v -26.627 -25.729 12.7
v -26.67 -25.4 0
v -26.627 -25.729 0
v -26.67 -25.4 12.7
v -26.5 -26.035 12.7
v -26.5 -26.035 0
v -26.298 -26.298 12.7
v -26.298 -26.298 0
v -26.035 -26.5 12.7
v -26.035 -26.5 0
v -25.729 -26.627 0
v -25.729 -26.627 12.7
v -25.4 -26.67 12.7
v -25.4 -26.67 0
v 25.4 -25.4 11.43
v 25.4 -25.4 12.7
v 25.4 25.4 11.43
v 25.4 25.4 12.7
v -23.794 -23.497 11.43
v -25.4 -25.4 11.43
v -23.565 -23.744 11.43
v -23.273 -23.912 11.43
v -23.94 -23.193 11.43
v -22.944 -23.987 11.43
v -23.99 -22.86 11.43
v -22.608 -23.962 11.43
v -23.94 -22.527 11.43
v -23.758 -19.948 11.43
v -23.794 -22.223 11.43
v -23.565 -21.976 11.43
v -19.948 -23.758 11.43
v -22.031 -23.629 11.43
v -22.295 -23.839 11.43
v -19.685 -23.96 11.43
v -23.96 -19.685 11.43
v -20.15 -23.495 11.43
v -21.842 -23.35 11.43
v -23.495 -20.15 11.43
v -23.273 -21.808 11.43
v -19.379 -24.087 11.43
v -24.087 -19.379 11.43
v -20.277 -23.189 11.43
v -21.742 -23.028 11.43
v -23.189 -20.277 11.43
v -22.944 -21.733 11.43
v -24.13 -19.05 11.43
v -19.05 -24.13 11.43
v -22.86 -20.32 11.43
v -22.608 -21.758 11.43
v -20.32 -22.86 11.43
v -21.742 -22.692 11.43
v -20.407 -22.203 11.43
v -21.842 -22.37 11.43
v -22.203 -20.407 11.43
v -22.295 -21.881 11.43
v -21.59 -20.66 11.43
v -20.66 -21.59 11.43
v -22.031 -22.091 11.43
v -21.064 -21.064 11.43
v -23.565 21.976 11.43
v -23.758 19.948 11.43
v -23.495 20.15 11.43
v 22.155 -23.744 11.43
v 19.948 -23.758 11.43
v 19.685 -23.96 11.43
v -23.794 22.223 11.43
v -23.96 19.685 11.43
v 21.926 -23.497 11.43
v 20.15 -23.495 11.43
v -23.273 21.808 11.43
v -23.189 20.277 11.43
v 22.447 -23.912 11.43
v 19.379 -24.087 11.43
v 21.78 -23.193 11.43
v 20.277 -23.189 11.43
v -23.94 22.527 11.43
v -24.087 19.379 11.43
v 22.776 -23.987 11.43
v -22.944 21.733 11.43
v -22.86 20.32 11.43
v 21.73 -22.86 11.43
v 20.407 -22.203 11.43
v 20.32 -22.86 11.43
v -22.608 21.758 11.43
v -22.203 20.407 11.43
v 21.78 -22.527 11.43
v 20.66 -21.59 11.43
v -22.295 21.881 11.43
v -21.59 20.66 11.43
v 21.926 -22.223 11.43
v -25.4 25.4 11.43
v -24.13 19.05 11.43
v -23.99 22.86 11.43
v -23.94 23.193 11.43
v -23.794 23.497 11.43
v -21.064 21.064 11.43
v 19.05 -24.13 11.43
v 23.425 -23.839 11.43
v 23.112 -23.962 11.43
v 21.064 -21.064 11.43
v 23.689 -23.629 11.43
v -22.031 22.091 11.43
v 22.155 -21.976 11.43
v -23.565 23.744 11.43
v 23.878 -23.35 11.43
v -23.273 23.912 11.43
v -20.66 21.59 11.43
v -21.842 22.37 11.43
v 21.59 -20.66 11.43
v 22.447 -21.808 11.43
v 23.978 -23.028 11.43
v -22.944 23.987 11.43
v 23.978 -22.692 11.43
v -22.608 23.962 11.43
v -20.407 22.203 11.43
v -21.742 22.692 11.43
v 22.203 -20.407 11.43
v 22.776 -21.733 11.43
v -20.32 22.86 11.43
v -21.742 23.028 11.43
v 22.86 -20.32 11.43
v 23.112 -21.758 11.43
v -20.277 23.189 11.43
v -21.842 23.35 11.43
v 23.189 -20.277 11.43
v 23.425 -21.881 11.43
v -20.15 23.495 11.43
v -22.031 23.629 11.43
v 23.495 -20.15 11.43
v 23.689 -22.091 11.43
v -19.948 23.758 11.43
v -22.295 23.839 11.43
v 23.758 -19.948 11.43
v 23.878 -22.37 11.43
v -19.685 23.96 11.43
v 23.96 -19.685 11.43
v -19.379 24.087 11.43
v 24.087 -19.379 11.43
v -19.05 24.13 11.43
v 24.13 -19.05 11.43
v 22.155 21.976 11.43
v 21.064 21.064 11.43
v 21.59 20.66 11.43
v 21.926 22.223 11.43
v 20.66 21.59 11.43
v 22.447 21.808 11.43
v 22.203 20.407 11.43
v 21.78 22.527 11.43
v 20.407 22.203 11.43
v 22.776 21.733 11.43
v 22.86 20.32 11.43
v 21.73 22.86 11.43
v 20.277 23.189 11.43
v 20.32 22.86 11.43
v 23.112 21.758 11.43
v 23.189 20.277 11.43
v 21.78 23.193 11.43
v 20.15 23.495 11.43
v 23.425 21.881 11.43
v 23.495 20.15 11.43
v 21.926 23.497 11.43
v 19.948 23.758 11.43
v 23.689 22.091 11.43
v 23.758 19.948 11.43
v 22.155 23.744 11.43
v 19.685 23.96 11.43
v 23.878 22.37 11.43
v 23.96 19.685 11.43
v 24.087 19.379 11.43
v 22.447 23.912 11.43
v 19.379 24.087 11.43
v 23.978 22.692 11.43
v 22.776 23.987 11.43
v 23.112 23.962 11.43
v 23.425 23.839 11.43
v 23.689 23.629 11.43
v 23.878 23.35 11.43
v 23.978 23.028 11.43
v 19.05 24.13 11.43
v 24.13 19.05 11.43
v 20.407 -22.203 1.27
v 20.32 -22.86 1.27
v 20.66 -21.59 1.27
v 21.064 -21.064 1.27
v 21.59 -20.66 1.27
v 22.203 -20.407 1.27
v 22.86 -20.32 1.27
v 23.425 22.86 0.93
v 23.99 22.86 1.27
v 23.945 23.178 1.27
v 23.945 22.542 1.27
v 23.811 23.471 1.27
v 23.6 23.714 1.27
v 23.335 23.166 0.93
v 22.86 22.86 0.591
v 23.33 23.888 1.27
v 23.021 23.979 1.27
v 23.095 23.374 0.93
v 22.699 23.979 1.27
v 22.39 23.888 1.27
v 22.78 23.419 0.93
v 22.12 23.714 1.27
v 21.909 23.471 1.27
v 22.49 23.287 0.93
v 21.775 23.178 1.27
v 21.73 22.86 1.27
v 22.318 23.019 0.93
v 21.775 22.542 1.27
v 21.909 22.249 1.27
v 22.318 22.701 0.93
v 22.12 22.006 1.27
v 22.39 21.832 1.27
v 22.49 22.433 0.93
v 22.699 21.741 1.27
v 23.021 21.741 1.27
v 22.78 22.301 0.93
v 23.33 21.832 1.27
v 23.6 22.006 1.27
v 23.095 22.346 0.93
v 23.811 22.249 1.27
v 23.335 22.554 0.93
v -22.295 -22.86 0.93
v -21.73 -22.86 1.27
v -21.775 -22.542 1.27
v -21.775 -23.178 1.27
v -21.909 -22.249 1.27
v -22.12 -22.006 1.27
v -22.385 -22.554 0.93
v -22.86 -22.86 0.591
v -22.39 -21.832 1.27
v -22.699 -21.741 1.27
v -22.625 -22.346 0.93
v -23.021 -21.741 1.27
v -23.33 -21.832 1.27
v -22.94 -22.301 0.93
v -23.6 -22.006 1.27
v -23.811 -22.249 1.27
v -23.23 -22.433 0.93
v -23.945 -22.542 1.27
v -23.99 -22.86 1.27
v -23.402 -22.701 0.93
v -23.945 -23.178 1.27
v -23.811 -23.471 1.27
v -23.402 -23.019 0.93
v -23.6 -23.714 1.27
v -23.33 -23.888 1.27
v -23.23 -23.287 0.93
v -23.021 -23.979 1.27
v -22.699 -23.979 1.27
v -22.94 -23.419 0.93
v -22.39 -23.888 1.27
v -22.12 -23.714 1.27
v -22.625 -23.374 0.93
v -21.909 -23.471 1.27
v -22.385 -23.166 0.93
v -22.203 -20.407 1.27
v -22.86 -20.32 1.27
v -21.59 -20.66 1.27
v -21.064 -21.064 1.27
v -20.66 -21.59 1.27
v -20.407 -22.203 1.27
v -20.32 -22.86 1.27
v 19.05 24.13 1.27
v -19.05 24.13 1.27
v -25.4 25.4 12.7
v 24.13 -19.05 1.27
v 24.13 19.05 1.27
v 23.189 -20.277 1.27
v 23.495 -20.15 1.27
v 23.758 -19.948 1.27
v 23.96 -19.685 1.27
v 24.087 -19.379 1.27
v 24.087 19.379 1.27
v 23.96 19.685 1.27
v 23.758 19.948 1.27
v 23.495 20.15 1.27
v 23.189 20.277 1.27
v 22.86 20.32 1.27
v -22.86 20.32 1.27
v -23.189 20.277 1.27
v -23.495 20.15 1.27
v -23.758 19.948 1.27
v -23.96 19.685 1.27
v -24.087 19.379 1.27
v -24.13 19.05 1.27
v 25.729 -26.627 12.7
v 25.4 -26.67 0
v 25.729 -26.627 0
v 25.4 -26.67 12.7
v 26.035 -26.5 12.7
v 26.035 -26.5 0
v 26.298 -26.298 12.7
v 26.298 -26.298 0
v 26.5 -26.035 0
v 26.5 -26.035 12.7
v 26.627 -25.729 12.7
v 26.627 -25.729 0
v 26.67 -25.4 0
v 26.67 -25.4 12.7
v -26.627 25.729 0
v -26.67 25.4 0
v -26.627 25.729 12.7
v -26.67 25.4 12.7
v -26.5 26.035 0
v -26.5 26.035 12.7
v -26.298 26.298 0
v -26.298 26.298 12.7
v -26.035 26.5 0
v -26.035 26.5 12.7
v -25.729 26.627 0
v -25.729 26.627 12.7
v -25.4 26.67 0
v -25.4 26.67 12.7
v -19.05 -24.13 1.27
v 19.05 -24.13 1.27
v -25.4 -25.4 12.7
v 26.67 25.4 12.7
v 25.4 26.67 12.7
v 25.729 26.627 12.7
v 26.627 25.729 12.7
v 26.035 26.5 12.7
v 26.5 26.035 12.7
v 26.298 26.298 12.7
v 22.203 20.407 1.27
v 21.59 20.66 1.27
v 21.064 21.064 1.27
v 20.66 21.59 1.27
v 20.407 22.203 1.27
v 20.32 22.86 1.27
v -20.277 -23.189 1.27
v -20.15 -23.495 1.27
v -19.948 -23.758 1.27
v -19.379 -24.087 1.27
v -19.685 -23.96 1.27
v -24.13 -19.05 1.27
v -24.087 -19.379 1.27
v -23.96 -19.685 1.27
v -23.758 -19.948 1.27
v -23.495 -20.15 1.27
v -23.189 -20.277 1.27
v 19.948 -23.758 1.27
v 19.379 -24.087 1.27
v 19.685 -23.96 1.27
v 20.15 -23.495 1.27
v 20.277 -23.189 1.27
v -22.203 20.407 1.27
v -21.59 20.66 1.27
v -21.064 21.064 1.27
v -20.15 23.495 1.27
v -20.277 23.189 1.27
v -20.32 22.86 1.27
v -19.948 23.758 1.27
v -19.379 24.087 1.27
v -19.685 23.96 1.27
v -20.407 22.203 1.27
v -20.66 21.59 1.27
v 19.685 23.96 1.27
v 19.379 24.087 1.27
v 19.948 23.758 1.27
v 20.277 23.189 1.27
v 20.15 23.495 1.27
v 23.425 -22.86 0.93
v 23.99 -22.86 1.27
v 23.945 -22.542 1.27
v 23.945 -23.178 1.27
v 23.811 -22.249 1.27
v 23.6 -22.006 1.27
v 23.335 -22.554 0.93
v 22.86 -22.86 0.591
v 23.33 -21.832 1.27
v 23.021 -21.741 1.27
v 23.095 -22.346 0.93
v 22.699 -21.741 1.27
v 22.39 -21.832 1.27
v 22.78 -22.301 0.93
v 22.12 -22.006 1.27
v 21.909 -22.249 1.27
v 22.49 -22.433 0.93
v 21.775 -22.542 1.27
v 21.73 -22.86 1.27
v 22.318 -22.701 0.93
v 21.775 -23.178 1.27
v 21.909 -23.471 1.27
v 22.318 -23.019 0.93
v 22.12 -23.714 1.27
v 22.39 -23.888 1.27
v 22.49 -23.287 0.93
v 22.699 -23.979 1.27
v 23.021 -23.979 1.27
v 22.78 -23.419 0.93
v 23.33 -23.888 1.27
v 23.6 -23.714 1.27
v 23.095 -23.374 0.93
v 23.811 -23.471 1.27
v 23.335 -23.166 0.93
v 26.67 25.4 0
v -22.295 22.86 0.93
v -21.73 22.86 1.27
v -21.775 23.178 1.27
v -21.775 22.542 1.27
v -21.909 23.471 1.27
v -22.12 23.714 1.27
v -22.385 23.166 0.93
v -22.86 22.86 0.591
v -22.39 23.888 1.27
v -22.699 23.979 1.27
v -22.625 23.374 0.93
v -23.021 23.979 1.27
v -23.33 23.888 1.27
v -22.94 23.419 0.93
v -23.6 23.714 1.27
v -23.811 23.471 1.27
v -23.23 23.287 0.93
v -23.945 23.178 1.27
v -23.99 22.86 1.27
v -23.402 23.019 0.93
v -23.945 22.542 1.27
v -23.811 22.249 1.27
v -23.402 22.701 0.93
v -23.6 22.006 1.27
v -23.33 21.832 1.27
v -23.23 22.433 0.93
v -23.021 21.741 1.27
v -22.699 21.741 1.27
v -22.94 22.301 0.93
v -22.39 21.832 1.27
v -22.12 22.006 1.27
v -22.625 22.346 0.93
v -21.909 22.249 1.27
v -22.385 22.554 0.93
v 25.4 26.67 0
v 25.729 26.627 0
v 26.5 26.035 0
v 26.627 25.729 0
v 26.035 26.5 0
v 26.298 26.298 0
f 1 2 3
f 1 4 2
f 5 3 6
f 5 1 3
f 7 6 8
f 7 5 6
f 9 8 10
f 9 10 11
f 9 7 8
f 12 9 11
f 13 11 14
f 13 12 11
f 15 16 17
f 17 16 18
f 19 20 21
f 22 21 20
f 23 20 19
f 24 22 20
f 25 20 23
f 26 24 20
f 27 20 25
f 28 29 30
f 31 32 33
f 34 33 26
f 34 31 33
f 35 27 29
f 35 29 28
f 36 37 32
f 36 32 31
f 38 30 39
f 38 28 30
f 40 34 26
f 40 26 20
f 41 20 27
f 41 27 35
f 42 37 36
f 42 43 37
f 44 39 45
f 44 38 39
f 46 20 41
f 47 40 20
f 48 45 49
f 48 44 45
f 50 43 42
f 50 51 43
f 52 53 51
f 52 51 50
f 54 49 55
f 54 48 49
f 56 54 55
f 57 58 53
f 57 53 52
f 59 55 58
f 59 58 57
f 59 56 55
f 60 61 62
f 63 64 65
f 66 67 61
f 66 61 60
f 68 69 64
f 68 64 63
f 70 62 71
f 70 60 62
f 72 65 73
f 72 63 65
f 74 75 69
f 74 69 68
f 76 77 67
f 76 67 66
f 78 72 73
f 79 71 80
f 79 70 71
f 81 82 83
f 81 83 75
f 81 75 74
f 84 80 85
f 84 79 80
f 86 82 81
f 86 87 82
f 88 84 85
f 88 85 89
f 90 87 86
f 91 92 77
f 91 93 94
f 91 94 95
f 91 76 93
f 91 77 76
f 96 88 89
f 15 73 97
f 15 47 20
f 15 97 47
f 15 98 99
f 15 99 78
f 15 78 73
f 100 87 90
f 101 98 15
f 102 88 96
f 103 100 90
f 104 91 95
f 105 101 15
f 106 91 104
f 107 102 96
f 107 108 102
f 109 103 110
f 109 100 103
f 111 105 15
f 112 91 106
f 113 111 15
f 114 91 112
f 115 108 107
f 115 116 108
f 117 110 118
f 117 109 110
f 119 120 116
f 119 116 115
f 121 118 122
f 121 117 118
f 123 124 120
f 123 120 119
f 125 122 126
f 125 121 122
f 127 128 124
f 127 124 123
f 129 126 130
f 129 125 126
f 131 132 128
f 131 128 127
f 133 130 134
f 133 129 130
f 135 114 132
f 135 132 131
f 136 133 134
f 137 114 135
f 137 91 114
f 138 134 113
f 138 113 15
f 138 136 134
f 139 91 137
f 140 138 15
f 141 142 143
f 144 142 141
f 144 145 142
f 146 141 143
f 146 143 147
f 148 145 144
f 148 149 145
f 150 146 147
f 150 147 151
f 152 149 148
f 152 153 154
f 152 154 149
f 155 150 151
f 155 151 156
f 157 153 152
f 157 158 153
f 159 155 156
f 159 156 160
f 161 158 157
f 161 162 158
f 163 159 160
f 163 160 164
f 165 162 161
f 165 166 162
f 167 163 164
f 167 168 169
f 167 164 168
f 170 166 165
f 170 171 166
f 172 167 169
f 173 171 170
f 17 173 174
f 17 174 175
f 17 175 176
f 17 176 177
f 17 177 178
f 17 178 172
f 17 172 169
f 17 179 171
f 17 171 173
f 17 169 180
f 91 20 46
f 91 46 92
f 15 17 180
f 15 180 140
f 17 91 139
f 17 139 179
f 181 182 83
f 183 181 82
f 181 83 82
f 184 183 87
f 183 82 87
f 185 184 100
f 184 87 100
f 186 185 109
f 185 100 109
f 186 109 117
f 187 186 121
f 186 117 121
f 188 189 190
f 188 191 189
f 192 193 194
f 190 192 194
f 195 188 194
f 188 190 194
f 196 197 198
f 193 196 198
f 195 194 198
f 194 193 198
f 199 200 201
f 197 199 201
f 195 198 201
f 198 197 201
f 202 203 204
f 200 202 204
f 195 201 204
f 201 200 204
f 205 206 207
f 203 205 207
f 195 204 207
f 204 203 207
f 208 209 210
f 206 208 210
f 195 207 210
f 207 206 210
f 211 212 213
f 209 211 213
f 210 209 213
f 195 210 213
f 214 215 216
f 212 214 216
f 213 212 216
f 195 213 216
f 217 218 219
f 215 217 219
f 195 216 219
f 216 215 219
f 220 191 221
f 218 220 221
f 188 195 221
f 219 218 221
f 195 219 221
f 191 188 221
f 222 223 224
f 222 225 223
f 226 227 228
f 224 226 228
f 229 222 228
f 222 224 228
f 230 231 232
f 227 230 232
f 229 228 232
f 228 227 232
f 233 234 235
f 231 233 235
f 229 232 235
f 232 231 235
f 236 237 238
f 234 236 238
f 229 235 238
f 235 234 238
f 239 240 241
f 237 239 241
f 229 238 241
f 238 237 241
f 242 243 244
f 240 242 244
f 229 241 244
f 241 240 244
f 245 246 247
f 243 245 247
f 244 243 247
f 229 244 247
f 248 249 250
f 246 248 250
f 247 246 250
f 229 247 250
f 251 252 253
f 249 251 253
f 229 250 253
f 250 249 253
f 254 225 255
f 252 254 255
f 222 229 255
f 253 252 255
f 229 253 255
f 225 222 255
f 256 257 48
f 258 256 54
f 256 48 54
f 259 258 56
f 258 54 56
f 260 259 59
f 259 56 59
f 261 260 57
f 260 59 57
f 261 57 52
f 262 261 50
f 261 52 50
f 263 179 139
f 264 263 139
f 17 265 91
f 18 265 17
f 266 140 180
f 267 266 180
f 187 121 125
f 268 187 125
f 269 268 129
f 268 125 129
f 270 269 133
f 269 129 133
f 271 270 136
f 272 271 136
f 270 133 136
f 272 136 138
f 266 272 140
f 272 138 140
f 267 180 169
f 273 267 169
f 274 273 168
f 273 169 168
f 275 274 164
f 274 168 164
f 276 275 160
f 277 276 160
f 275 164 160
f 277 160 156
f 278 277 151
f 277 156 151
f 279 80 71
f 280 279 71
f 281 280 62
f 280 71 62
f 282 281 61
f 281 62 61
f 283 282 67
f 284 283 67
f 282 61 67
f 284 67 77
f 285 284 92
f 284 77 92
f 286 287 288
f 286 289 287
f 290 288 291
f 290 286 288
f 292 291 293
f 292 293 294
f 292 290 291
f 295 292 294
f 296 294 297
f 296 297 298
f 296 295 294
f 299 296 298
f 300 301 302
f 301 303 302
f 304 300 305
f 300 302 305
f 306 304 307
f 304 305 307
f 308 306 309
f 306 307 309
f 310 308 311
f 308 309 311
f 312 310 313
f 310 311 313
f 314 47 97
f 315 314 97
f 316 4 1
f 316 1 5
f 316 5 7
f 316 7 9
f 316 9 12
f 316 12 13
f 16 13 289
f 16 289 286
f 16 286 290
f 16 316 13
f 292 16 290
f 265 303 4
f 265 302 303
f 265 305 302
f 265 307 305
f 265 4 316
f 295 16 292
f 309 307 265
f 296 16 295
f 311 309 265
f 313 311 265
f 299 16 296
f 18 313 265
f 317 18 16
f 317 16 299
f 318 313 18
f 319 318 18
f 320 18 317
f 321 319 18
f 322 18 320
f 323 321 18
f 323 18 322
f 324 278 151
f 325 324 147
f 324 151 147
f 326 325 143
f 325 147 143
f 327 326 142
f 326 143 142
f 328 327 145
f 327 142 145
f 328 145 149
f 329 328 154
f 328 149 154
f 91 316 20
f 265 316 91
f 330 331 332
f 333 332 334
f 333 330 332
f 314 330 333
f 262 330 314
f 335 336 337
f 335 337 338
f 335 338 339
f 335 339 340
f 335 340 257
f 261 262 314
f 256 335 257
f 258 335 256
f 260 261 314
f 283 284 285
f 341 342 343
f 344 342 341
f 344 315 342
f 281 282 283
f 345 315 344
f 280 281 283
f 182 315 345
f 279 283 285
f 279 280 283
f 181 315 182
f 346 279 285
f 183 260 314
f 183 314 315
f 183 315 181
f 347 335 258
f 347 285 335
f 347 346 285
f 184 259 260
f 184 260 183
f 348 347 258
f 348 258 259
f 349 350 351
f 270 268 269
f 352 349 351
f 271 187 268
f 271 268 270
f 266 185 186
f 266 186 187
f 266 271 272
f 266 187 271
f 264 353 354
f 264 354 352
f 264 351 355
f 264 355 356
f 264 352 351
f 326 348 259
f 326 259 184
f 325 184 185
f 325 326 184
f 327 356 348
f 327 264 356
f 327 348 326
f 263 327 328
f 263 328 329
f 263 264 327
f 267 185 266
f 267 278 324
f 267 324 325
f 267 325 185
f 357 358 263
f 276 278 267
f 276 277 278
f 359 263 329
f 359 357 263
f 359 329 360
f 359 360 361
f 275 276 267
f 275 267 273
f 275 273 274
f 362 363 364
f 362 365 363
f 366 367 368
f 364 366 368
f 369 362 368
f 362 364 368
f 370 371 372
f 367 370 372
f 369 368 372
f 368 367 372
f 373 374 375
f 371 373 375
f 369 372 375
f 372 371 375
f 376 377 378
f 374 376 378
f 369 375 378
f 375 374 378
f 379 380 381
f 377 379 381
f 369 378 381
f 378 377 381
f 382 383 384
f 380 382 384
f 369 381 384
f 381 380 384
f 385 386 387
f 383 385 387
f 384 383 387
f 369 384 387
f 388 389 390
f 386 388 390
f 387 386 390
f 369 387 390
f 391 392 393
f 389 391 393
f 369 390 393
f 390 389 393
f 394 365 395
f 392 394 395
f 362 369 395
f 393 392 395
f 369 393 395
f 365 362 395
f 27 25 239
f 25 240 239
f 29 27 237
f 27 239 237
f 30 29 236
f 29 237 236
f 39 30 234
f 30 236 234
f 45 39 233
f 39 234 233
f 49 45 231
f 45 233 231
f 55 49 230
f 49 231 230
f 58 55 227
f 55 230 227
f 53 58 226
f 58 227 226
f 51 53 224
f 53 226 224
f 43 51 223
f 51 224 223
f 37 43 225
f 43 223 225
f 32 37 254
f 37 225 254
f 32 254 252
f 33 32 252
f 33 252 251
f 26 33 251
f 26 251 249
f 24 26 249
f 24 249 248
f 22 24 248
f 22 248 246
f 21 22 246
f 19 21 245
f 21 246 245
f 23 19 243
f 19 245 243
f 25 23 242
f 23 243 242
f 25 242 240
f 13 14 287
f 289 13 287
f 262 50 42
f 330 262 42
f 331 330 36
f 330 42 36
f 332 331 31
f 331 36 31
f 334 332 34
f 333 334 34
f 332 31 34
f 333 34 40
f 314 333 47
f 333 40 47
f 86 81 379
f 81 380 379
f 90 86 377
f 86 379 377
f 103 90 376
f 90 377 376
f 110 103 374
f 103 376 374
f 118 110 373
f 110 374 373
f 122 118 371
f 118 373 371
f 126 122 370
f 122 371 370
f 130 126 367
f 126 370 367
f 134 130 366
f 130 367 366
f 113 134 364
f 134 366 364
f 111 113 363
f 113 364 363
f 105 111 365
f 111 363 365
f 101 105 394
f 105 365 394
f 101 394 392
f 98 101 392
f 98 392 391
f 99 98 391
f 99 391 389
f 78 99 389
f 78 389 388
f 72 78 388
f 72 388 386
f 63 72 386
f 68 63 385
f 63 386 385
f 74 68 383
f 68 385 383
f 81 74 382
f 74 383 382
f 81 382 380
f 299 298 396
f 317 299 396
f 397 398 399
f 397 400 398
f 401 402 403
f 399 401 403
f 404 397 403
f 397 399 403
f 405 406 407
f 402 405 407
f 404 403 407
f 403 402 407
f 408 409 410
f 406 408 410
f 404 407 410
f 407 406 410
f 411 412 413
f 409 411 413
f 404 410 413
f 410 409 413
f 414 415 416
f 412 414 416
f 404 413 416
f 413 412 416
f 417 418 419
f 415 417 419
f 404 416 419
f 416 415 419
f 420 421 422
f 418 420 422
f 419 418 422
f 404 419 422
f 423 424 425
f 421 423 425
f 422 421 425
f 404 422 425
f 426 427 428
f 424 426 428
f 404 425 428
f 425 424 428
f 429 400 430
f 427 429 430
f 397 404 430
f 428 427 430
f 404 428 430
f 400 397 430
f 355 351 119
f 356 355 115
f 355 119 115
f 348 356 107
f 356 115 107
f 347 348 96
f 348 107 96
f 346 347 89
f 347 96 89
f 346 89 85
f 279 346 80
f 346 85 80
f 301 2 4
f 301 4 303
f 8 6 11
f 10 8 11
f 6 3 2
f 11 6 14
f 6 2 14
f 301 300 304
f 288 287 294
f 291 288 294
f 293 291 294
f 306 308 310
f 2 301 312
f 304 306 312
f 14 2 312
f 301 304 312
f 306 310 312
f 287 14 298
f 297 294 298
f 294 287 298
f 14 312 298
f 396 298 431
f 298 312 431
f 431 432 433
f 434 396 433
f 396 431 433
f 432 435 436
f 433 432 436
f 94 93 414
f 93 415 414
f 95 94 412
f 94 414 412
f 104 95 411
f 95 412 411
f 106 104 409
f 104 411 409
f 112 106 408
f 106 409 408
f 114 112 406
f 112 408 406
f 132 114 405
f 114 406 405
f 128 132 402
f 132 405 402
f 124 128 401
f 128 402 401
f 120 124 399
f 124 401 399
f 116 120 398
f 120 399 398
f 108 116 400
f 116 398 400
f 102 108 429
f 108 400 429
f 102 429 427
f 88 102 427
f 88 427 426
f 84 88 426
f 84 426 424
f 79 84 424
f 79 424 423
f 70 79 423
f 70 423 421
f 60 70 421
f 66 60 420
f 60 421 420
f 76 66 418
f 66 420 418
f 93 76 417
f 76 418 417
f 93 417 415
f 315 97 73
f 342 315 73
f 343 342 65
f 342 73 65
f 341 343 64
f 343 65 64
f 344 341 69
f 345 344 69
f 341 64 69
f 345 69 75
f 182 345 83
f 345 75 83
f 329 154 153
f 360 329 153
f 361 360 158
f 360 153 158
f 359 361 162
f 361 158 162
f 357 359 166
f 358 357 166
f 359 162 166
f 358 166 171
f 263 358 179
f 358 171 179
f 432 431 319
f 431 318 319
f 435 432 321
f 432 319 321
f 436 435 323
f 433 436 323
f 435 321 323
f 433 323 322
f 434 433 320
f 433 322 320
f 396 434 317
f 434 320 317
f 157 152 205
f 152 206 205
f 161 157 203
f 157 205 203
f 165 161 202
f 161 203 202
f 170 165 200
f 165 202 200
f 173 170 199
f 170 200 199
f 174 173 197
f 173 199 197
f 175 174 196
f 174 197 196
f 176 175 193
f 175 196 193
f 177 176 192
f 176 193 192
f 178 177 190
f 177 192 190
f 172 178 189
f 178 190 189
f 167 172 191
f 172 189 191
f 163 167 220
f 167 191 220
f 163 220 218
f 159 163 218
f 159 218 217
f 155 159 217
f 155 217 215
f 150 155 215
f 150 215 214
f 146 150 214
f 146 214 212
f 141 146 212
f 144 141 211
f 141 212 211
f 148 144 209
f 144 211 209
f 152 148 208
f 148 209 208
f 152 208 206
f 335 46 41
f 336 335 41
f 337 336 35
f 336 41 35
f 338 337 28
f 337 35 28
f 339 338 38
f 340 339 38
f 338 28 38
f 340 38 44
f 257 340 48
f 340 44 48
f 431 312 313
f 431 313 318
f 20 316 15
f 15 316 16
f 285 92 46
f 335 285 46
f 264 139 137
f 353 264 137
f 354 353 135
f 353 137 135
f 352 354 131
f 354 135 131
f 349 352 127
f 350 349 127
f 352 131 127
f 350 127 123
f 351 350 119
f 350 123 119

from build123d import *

# Parameters (mm, degrees)
F0_W     = 53.34
F0_H     = 53.34
F1_DEPTH = 12.7
F3_D     = 2.2606
F3_DEPTH = 11.43
F3_TIP   = 0.6791527577
F5_DEPTH = 11.43
F4_W     = 50.8
F4_H     = 50.8
F6_DEPTH = 1.27
F7_R     = 1.27


with BuildPart() as f1:
    # F0 (on Top) → F1 (new body)
    with BuildSketch(Plane.XY):
        Rectangle(F0_W, F0_H)
    extrude(amount=F1_DEPTH)

    # F3
    with Locations(Plane.XY.offset(12.7)):
        with Locations((-22.86, 22.86), (22.86, 22.86), (22.86, -22.86), (-22.86, -22.86)):
            Hole(F3_D / 2, depth=F3_DEPTH)
            with Locations((0, 0, -(F3_DEPTH + F3_TIP / 2))):  # 118° drill point
                Cone(0, F3_D / 2, F3_TIP, mode=Mode.SUBTRACT)

    # F2 (on face) → F5 (cut)
    with BuildSketch(Plane.XY.offset(12.7)):
        with BuildLine():
            Line((0, 24.13), (-19.05, 24.13))
            ThreePointArc((-19.05, 24.13), (-19.9480256121, 23.7580256121), (-20.32, 22.86))
            ThreePointArc((-20.32, 22.86), (-21.0639487758, 21.0639487758), (-22.86, 20.32))
            ThreePointArc((-22.86, 20.32), (-23.7580256121, 19.9480256121), (-24.13, 19.05))
            Line((-24.13, 19.05), (-24.13, 0))
            Line((-24.13, 0), (-24.13, -19.05))
            ThreePointArc((-24.13, -19.05), (-23.7580256121, -19.9480256121), (-22.86, -20.32))
            ThreePointArc((-22.86, -20.32), (-21.0639487758, -21.0639487758), (-20.32, -22.86))
            ThreePointArc((-20.32, -22.86), (-19.9480256121, -23.7580256121), (-19.05, -24.13))
            Line((-19.05, -24.13), (0, -24.13))
            Line((0, -24.13), (19.05, -24.13))
            ThreePointArc((19.05, -24.13), (19.9480256121, -23.7580256121), (20.32, -22.86))
            ThreePointArc((20.32, -22.86), (21.0639487758, -21.0639487758), (22.86, -20.32))
            ThreePointArc((22.86, -20.32), (23.7580256121, -19.9480256121), (24.13, -19.05))
            Line((24.13, -19.05), (24.13, 0))
            Line((24.13, 0), (24.13, 19.05))
            ThreePointArc((24.13, 19.05), (23.7580256121, 19.9480256121), (22.86, 20.32))
            ThreePointArc((22.86, 20.32), (21.0639487758, 21.0639487758), (20.32, 22.86))
            ThreePointArc((20.32, 22.86), (19.9480256121, 23.7580256121), (19.05, 24.13))
            Line((19.05, 24.13), (0, 24.13))
        make_face()
    extrude(amount=-F5_DEPTH, mode=Mode.SUBTRACT)

    # F4 (on face) → F6 (cut)
    with BuildSketch(Plane.XY.offset(12.7)):
        Rectangle(F4_W, F4_H)
    extrude(amount=-F6_DEPTH, mode=Mode.SUBTRACT)

    # F7
    f7_edges = [f1.edges().sort_by_distance(p)[0] for p in [
        (-26.67, -26.67, 6.35),
        (26.67, -26.67, 6.35),
        (26.67, 26.67, 6.35),
        (-26.67, 26.67, 6.35),
    ]]
    fillet(f7_edges, radius=F7_R)


solid = f1.part
